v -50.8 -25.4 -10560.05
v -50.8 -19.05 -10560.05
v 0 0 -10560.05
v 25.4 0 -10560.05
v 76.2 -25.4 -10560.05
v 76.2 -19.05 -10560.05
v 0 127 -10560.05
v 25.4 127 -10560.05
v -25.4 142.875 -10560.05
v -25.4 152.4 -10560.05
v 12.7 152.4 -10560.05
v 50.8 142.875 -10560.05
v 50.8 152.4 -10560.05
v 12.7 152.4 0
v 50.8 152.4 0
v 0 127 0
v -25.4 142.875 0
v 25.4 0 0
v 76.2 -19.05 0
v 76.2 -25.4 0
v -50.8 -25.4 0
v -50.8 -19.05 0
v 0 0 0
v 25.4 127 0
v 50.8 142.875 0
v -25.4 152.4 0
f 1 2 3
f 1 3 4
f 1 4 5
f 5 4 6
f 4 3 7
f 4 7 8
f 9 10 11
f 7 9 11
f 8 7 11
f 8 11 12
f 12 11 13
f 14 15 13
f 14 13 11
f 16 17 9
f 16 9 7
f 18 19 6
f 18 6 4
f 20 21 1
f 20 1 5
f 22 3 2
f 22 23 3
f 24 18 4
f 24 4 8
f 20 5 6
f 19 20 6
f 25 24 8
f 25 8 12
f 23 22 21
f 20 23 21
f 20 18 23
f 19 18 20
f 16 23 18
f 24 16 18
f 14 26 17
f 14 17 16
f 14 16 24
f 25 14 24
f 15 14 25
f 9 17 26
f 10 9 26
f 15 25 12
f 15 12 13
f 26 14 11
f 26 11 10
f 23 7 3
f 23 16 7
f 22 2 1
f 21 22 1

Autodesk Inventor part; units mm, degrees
ref_plane "YZ Plane" through (0, 0, 0) normal (1, 0, 0) x (0, 1, 0)
ref_plane "XZ Plane" through (0, 0, 0) normal (0, 1, 0) x (-1, 0, 0)
ref_plane "XY Plane" through (0, 0, 0) normal (0, 0, 1) x (1, 0, 0)
sketch "Sketch1" plane through (0, 0, 0) normal (0, 0, 1) x (1, 0, 0)
  line L0 (0, 0) -> (-50.8, -19.05)
  line L1 (76.2, -19.05) -> (25.4, 0)
  line L2 (25.4, 0) -> (25.4, 127)
  line L3 (25.4, 127) -> (50.8, 142.875)
  line L4 (-25.4, 142.875) -> (0, 127)
  line L5 (0, 127) -> (0, 0)
  line L6 (0, 0) -> (25.4, 0) construction
  line L7 (0, 127) -> (25.4, 127) construction
  line L8 (12.7, 0) -> (12.7, 127) construction
  line L9 (-50.8, -19.05) -> (-50.8, -25.4)
  line L10 (-50.8, -25.4) -> (76.2, -25.4)
  line L11 (76.2, -25.4) -> (76.2, -19.05)
  line L12 (50.8, 142.875) -> (50.8, 152.4)
  line L13 (50.8, 152.4) -> (-25.4, 152.4)
  line L14 (-25.4, 142.875) -> (50.8, 142.875) construction
  line L15 (-50.8, -19.05) -> (76.2, -19.05) construction
  line L16 (-25.4, 142.875) -> (-25.4, 152.4)
  line L17 (0, 0) -> (12.7, 0) construction
  line L18 (12.7, 0) -> (12.7, 152.4) construction
  line L19 (12.7, 152.4) -> (50.8, 152.4)
  dimension "d1" = 127
  dimension "d2" = 15.875
  dimension "d3" = 25.4
  dimension "d4" = 6.35
  dimension "d8" = 50.8
  dimension "d9" = 50.8
  dimension "d10" = 25.4
  dimension "d11" = 127
  dimension "d12" = 25.4
  dimension "d13" = 177.8
  dimension "d14" = 25.4
  dimension "d17" = 12.7
extrude "Extrusion1" add sketch "Sketch1" against normal blind 10560.05
properties part number "Long I-Beam" material "Steel ASTM A36"
